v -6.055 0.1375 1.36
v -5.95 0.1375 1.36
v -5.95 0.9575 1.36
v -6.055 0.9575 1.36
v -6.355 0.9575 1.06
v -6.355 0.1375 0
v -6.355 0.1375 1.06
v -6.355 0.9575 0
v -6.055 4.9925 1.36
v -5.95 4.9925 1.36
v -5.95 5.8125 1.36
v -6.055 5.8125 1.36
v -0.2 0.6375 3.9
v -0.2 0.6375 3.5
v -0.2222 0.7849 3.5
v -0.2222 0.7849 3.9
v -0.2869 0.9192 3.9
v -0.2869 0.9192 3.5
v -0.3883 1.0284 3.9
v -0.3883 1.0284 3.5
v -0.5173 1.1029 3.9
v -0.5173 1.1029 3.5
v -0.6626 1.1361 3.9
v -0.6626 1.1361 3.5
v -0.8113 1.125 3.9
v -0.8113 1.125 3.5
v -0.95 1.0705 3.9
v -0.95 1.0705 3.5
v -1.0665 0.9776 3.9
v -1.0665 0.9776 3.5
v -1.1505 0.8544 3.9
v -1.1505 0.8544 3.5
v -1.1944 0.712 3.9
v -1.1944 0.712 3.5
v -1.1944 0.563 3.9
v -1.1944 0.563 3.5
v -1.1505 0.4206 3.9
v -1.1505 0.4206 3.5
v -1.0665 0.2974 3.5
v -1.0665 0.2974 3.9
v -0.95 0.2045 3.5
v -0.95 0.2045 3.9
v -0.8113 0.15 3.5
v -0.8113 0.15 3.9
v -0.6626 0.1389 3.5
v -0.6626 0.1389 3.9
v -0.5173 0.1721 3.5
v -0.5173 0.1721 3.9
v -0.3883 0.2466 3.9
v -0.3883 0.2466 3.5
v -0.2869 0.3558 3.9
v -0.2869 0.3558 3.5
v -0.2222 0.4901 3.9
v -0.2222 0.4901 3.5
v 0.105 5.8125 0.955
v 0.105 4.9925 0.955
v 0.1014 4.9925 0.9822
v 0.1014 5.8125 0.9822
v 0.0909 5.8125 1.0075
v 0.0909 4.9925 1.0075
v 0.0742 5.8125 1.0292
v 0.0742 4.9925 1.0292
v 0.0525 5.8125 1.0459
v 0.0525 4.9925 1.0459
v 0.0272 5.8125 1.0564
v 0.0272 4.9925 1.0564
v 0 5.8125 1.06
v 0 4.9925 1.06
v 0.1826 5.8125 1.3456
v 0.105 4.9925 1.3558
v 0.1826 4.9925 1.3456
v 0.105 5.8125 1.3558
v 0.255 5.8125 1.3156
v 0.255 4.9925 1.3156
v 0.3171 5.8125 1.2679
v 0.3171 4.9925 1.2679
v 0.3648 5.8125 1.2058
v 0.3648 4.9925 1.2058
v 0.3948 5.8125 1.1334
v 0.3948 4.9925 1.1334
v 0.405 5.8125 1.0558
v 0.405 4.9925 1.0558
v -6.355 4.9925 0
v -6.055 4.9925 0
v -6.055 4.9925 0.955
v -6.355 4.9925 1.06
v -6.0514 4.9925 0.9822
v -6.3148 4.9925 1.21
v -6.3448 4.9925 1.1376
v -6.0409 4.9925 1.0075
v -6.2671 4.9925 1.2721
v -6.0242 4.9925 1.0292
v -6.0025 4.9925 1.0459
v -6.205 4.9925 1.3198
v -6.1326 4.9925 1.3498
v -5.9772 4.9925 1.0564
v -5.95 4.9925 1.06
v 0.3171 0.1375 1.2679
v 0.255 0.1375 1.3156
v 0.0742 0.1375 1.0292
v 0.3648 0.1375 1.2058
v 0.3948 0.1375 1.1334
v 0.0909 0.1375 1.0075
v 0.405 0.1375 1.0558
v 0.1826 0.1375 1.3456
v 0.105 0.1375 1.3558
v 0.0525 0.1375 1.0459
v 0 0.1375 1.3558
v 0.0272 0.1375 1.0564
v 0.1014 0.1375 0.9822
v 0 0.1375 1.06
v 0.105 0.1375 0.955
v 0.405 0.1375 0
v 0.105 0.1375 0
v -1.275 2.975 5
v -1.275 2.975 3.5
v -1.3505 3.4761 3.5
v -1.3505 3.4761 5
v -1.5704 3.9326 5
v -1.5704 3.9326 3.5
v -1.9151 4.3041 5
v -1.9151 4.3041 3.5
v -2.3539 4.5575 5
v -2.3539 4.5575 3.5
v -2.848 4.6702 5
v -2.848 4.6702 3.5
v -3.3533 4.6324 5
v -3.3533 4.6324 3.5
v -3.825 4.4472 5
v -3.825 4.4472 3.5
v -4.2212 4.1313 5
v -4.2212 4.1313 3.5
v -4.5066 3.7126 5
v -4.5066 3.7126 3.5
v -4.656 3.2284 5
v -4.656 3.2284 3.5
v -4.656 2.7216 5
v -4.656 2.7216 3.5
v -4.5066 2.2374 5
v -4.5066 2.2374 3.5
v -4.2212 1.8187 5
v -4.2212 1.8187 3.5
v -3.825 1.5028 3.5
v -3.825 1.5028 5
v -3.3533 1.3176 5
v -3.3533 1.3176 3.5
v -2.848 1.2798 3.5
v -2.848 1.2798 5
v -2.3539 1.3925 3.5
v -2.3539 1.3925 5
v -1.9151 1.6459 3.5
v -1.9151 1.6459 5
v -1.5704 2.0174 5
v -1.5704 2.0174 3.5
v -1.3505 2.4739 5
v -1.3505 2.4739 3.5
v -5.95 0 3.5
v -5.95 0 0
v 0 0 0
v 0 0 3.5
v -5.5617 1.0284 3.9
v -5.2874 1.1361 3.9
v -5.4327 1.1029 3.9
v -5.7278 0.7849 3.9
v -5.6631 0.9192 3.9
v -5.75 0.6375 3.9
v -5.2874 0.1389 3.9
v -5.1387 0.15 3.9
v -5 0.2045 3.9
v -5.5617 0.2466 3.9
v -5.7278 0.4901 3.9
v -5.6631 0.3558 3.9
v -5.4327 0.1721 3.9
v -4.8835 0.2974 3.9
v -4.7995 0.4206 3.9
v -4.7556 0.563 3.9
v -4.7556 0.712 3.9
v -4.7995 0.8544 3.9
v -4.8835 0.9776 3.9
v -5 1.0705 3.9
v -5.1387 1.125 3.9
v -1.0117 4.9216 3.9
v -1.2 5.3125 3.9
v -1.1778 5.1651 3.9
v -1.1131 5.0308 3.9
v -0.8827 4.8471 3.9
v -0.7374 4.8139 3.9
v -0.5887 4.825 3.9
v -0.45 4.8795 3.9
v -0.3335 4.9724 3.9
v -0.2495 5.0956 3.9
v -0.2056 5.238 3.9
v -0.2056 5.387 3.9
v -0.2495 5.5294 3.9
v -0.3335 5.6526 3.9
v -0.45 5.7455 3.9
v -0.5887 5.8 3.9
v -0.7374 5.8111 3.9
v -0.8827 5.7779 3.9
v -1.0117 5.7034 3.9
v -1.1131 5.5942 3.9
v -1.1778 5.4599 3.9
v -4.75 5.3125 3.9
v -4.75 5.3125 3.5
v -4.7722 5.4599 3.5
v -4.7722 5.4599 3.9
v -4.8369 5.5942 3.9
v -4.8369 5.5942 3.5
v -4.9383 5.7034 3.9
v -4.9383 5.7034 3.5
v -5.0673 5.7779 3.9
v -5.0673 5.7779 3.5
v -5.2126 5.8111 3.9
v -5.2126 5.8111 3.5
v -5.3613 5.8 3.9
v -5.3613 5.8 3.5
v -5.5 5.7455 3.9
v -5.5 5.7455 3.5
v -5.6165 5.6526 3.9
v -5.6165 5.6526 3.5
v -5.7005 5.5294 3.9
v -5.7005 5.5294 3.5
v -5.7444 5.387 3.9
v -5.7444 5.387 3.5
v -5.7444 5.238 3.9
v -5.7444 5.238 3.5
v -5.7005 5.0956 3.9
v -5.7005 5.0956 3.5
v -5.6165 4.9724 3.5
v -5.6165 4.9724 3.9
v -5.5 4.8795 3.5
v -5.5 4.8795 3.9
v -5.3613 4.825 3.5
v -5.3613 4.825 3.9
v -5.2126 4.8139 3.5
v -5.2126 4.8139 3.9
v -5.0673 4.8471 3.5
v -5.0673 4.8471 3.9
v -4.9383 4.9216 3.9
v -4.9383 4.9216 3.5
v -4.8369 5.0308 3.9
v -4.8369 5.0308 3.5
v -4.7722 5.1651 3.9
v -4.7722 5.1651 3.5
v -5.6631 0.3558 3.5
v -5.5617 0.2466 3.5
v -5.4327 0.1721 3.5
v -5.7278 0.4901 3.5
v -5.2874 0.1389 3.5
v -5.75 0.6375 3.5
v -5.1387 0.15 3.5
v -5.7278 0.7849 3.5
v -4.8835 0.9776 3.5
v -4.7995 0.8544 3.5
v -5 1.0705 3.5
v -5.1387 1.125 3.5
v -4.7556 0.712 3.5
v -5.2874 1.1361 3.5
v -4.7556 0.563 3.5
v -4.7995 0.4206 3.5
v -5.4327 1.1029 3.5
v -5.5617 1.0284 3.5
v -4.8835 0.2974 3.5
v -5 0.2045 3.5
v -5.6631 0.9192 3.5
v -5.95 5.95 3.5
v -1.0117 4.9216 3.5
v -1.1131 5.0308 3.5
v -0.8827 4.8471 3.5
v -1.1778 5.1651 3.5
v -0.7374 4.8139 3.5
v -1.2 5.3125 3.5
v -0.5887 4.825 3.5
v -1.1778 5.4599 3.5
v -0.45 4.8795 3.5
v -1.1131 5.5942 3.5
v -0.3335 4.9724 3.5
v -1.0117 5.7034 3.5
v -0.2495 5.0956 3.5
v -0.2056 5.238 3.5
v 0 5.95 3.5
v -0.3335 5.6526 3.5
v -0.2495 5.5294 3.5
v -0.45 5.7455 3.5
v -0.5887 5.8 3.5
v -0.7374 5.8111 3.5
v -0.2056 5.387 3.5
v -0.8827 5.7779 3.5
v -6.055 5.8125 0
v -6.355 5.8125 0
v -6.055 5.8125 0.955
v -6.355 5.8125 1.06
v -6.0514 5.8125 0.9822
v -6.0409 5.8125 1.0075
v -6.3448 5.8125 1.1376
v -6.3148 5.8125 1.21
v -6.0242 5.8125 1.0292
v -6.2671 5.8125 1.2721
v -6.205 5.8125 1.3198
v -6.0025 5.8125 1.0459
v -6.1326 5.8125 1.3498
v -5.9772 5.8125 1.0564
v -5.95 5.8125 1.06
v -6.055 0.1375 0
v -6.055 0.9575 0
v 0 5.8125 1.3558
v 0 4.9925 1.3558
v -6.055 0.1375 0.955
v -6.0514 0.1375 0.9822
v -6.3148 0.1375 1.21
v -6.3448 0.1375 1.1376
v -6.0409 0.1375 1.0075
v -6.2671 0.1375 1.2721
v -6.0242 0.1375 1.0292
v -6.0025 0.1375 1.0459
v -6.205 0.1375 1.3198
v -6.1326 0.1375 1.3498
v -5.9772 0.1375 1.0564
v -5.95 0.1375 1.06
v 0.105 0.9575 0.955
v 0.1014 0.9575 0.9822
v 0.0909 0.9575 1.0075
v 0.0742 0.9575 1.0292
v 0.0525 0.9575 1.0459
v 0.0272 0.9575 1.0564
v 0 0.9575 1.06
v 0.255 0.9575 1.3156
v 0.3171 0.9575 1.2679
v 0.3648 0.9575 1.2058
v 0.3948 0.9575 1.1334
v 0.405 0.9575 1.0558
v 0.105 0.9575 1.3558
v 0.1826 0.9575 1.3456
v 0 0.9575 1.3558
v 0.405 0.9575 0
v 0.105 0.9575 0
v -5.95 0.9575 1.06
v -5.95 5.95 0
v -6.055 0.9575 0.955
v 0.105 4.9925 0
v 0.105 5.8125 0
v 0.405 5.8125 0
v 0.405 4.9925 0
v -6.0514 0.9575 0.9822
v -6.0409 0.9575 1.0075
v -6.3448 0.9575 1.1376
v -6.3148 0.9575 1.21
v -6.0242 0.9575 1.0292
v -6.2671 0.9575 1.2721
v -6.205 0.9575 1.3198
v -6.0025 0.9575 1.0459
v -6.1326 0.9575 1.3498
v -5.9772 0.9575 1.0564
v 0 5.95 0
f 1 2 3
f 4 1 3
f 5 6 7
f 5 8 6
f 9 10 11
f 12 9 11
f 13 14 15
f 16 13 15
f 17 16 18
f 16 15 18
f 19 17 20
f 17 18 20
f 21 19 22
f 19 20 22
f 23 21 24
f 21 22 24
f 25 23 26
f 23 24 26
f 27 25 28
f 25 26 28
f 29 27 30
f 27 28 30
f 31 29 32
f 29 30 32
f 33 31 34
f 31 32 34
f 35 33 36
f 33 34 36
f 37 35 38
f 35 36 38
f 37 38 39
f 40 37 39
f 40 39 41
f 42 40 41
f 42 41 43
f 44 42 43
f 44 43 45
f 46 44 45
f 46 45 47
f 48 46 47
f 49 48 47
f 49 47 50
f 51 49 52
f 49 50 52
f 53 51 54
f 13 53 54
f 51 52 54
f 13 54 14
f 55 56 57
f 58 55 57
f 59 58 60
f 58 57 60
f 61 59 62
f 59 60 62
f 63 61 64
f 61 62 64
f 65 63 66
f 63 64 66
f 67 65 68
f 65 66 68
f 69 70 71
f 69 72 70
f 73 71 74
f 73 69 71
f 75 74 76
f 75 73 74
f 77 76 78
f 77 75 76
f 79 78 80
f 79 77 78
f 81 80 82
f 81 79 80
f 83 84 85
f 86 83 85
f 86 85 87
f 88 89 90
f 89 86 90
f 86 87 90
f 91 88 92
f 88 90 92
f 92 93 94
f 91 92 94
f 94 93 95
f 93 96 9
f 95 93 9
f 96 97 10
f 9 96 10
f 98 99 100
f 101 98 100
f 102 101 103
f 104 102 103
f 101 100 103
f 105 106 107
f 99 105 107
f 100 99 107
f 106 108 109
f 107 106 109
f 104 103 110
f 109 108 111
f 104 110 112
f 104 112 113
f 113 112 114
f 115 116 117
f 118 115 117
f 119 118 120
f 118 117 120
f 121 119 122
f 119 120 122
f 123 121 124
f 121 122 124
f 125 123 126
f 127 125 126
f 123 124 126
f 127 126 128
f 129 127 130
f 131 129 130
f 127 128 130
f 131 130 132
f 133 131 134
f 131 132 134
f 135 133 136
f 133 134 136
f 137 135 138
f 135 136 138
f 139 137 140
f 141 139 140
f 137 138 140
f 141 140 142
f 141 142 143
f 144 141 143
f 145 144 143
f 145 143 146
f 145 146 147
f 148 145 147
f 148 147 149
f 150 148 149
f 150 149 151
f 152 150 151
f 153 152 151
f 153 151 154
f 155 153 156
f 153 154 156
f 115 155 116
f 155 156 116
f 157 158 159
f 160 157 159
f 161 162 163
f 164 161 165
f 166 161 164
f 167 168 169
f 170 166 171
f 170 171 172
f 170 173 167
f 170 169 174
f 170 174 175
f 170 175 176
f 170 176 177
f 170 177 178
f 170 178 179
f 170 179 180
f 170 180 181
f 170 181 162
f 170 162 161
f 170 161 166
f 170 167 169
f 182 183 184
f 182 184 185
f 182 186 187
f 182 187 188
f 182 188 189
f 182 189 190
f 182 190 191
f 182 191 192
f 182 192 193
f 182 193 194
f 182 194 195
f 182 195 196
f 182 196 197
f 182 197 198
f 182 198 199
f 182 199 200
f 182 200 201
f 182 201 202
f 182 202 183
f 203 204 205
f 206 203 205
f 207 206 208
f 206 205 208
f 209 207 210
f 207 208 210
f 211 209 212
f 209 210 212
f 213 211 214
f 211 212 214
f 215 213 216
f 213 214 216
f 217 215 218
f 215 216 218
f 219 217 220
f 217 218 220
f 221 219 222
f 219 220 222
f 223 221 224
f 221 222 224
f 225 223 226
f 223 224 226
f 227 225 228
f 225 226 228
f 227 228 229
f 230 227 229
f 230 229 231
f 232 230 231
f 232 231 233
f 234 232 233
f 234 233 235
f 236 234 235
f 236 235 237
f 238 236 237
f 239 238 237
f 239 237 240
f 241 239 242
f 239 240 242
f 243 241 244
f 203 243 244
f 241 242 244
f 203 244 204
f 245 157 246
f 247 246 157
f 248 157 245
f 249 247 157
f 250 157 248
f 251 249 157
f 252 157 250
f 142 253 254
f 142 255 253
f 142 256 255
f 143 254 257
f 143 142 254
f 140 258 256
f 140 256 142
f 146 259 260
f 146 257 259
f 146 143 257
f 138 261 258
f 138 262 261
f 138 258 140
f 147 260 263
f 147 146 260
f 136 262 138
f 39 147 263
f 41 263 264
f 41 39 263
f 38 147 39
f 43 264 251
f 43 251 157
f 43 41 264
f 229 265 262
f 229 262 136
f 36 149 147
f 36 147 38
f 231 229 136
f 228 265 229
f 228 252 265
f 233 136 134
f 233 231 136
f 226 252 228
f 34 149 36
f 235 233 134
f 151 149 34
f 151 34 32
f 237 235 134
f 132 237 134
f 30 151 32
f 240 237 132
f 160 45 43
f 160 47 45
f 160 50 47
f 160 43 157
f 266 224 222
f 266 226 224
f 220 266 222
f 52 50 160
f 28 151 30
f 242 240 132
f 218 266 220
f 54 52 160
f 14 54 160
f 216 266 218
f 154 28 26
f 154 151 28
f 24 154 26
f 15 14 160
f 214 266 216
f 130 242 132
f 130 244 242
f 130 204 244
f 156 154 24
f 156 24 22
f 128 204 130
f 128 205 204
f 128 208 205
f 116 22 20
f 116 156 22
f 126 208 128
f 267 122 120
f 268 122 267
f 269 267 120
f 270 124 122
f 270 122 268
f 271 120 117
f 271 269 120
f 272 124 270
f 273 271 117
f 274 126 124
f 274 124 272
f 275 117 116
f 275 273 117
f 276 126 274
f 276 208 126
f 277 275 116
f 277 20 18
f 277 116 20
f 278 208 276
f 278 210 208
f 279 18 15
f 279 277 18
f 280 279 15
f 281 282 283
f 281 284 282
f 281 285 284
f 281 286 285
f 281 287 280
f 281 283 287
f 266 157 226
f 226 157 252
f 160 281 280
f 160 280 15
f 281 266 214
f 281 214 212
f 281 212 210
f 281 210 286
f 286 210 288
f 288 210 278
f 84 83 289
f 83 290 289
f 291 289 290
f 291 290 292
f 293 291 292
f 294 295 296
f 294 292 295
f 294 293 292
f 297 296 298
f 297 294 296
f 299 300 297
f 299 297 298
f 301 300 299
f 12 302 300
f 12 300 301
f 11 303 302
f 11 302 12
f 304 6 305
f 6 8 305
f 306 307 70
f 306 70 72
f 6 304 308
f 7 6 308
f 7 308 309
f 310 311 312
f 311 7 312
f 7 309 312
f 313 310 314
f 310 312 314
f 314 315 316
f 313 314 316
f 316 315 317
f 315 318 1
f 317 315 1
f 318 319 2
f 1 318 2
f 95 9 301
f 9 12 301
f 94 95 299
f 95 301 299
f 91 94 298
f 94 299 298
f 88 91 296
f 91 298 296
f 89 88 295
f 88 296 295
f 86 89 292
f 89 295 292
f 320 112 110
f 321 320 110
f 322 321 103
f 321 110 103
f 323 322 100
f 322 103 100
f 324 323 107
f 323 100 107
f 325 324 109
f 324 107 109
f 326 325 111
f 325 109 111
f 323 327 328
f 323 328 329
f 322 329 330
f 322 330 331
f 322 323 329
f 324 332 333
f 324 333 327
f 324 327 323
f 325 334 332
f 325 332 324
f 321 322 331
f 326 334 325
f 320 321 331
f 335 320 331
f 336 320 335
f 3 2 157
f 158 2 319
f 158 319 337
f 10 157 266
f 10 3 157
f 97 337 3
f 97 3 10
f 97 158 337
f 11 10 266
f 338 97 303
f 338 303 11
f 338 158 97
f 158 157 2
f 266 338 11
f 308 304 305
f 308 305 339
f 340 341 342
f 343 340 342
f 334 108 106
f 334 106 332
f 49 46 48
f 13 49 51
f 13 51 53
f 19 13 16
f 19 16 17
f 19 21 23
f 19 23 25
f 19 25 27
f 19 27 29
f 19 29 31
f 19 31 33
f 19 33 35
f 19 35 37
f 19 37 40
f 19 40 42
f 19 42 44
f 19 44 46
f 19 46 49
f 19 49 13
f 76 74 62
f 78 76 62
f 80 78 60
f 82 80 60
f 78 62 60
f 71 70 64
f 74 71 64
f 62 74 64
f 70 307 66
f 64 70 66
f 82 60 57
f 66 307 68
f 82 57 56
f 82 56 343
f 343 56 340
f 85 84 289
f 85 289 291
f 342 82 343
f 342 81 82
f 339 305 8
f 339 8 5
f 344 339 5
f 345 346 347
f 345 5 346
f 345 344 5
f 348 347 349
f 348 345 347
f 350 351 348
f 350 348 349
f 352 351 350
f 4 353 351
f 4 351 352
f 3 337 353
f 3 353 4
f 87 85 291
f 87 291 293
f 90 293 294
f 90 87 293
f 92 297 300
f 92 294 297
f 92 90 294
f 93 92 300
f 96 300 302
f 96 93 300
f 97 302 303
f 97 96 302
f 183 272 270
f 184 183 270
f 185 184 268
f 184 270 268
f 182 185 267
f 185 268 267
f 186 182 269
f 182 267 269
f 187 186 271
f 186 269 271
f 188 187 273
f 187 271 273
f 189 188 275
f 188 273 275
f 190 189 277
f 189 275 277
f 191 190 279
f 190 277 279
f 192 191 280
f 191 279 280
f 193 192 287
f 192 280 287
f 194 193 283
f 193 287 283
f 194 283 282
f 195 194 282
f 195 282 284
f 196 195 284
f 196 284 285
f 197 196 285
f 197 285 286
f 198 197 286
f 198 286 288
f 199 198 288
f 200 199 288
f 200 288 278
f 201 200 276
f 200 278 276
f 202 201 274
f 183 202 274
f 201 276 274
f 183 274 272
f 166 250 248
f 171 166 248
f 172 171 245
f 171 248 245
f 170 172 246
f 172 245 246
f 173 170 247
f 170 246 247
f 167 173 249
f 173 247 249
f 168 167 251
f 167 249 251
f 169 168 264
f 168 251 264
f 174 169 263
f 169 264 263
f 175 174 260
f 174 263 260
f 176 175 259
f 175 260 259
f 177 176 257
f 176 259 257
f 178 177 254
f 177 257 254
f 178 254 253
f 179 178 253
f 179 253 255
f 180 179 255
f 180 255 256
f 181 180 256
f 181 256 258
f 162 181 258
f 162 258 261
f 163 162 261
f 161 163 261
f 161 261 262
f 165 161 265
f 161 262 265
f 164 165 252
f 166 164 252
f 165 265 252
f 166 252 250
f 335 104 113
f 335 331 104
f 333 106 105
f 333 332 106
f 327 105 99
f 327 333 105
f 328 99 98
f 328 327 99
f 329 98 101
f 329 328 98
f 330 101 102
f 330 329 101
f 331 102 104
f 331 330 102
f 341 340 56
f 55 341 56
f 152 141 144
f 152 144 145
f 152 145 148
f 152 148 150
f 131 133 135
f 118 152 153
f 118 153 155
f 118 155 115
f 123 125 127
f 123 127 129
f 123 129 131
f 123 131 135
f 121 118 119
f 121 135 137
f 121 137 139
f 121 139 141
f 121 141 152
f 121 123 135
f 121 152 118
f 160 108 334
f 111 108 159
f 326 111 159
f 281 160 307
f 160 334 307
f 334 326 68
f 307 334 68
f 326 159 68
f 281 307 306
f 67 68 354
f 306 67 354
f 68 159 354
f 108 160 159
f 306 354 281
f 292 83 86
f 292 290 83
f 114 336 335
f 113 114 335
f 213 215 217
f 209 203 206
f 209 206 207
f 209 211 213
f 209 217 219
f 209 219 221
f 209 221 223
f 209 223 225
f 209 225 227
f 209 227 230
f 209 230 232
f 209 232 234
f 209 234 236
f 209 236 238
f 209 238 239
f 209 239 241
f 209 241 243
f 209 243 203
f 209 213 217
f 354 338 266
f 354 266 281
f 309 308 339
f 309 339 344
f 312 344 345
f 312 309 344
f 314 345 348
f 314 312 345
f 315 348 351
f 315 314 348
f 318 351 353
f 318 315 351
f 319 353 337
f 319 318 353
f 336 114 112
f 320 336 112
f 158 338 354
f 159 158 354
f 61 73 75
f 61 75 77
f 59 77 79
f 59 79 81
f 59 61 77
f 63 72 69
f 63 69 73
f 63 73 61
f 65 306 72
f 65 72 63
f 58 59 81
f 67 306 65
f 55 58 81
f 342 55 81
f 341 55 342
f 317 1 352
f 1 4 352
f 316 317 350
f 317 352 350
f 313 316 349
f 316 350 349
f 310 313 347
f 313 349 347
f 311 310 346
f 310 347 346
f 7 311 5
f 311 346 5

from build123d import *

# Parameters (mm, degrees)
CROQUIS1_W              = 5.95
CROQUIS1_H              = 5.95
SALIENTE_EXTRUIR1_DEPTH = 3.5
CROQUIS3_R              = 1.7
SALIENTE_EXTRUIR2_DEPTH = 1.5
CROQUIS4_R              = 0.5
SALIENTE_EXTRUIR3_DEPTH = 0.4
CROQUIS5_W              = 1.355791782
CROQUIS5_H              = 0.82
SALIENTE_EXTRUIR4_DEPTH = 0.405
REDONDEO1_R             = 0.3
REDONDEO2_R             = 0.3
CROQUIS9_W              = 1.36
CROQUIS9_H              = 0.82
SALIENTE_EXTRUIR5_DEPTH = 0.405
REDONDEO3_R             = 0.3
REDONDEO4_R             = 0.3
CORTAR_EXTRUIR1_DEPTH   = 10.958472837


with BuildPart() as part:
    # Croquis1 → Saliente-Extruir1 (new body)
    with BuildSketch(Plane.XY):
        with Locations((-2.975, 2.975)):
            Rectangle(CROQUIS1_W, CROQUIS1_H)
    extrude(amount=SALIENTE_EXTRUIR1_DEPTH)

    # Croquis3 → Saliente-Extruir2 (add)
    with BuildSketch(Plane.XY.offset(3.5)):
        with Locations((-2.975, 2.975)):
            Circle(CROQUIS3_R)
    extrude(amount=SALIENTE_EXTRUIR2_DEPTH)

    # Croquis4 → Saliente-Extruir3 (add)
    with BuildSketch(Plane.XY.offset(3.5)):
        with Locations((-5.25, 5.3125)):
            Circle(CROQUIS4_R)
        with Locations(Location((-0.7, 5.3125, 0), (0, 0, 180))):
            Circle(CROQUIS4_R)
        with Locations((-0.7, 0.6375)):
            Circle(CROQUIS4_R)
        with Locations(Location((-5.25, 0.6375, 0), (0, 0, 180))):
            Circle(CROQUIS4_R)
    extrude(amount=SALIENTE_EXTRUIR3_DEPTH)

    # Croquis5 → Saliente-Extruir4 (add)
    with BuildSketch(Plane(origin=(0, 0, 0), x_dir=(0, 0, -1), z_dir=(1, 0, 0))):
        with Locations((-0.677895891, 5.4025)):
            Rectangle(CROQUIS5_W, CROQUIS5_H)
        with Locations((-0.677895891, 0.5475)):
            Rectangle(CROQUIS5_W, CROQUIS5_H)
    extrude(amount=SALIENTE_EXTRUIR4_DEPTH)

    # Redondeo1
    redondeo1_edges = [part.edges().sort_by_distance(p)[0] for p in [
        (0.405, 5.4025, 1.355791782),
    ]]
    fillet(redondeo1_edges, radius=REDONDEO1_R)

    # Redondeo2
    redondeo2_edges = [part.edges().sort_by_distance(p)[0] for p in [
        (0.405, 0.5475, 1.355791782),
    ]]
    fillet(redondeo2_edges, radius=REDONDEO2_R)

    # Croquis9 → Saliente-Extruir5 (add)
    with BuildSketch(Plane.ZY.offset(5.95)):
        with Locations((0.68, 5.4025)):
            Rectangle(CROQUIS9_W, CROQUIS9_H)
        with Locations((0.68, 0.5475)):
            Rectangle(CROQUIS9_W, CROQUIS9_H)
    extrude(amount=SALIENTE_EXTRUIR5_DEPTH)

    # Redondeo3
    redondeo3_edges = [part.edges().sort_by_distance(p)[0] for p in [
        (-6.355, 5.4025, 1.36),
    ]]
    fillet(redondeo3_edges, radius=REDONDEO3_R)

    # Redondeo4
    redondeo4_edges = [part.edges().sort_by_distance(p)[0] for p in [
        (-6.355, 0.5475, 1.36),
    ]]
    fillet(redondeo4_edges, radius=REDONDEO4_R)

    # Croquis10 → Cortar-Extruir1 (cut, through all)
    with BuildSketch(Plane.XZ.offset(-0.1375)):
        with BuildLine():
            Line((-5.95, 0), (-6.055, 0))
            Line((-6.055, 0), (-6.055, 0.955))
            ThreePointArc((-6.055, 0.955), (-6.024246212, 1.029246212), (-5.95, 1.06))
            Line((-5.95, 1.06), (-5.95, 0))
        make_face()
        with BuildLine():
            Line((0.105, 0), (0.105, 0.955))
            ThreePointArc((0.105, 0.955), (0.074246212, 1.029246212), (0, 1.06))
            Line((0, 1.06), (0, 0))
            Line((0, 0), (0.105, 0))
        make_face()
    extrude(amount=-CORTAR_EXTRUIR1_DEPTH, mode=Mode.SUBTRACT)


solid = part.part
